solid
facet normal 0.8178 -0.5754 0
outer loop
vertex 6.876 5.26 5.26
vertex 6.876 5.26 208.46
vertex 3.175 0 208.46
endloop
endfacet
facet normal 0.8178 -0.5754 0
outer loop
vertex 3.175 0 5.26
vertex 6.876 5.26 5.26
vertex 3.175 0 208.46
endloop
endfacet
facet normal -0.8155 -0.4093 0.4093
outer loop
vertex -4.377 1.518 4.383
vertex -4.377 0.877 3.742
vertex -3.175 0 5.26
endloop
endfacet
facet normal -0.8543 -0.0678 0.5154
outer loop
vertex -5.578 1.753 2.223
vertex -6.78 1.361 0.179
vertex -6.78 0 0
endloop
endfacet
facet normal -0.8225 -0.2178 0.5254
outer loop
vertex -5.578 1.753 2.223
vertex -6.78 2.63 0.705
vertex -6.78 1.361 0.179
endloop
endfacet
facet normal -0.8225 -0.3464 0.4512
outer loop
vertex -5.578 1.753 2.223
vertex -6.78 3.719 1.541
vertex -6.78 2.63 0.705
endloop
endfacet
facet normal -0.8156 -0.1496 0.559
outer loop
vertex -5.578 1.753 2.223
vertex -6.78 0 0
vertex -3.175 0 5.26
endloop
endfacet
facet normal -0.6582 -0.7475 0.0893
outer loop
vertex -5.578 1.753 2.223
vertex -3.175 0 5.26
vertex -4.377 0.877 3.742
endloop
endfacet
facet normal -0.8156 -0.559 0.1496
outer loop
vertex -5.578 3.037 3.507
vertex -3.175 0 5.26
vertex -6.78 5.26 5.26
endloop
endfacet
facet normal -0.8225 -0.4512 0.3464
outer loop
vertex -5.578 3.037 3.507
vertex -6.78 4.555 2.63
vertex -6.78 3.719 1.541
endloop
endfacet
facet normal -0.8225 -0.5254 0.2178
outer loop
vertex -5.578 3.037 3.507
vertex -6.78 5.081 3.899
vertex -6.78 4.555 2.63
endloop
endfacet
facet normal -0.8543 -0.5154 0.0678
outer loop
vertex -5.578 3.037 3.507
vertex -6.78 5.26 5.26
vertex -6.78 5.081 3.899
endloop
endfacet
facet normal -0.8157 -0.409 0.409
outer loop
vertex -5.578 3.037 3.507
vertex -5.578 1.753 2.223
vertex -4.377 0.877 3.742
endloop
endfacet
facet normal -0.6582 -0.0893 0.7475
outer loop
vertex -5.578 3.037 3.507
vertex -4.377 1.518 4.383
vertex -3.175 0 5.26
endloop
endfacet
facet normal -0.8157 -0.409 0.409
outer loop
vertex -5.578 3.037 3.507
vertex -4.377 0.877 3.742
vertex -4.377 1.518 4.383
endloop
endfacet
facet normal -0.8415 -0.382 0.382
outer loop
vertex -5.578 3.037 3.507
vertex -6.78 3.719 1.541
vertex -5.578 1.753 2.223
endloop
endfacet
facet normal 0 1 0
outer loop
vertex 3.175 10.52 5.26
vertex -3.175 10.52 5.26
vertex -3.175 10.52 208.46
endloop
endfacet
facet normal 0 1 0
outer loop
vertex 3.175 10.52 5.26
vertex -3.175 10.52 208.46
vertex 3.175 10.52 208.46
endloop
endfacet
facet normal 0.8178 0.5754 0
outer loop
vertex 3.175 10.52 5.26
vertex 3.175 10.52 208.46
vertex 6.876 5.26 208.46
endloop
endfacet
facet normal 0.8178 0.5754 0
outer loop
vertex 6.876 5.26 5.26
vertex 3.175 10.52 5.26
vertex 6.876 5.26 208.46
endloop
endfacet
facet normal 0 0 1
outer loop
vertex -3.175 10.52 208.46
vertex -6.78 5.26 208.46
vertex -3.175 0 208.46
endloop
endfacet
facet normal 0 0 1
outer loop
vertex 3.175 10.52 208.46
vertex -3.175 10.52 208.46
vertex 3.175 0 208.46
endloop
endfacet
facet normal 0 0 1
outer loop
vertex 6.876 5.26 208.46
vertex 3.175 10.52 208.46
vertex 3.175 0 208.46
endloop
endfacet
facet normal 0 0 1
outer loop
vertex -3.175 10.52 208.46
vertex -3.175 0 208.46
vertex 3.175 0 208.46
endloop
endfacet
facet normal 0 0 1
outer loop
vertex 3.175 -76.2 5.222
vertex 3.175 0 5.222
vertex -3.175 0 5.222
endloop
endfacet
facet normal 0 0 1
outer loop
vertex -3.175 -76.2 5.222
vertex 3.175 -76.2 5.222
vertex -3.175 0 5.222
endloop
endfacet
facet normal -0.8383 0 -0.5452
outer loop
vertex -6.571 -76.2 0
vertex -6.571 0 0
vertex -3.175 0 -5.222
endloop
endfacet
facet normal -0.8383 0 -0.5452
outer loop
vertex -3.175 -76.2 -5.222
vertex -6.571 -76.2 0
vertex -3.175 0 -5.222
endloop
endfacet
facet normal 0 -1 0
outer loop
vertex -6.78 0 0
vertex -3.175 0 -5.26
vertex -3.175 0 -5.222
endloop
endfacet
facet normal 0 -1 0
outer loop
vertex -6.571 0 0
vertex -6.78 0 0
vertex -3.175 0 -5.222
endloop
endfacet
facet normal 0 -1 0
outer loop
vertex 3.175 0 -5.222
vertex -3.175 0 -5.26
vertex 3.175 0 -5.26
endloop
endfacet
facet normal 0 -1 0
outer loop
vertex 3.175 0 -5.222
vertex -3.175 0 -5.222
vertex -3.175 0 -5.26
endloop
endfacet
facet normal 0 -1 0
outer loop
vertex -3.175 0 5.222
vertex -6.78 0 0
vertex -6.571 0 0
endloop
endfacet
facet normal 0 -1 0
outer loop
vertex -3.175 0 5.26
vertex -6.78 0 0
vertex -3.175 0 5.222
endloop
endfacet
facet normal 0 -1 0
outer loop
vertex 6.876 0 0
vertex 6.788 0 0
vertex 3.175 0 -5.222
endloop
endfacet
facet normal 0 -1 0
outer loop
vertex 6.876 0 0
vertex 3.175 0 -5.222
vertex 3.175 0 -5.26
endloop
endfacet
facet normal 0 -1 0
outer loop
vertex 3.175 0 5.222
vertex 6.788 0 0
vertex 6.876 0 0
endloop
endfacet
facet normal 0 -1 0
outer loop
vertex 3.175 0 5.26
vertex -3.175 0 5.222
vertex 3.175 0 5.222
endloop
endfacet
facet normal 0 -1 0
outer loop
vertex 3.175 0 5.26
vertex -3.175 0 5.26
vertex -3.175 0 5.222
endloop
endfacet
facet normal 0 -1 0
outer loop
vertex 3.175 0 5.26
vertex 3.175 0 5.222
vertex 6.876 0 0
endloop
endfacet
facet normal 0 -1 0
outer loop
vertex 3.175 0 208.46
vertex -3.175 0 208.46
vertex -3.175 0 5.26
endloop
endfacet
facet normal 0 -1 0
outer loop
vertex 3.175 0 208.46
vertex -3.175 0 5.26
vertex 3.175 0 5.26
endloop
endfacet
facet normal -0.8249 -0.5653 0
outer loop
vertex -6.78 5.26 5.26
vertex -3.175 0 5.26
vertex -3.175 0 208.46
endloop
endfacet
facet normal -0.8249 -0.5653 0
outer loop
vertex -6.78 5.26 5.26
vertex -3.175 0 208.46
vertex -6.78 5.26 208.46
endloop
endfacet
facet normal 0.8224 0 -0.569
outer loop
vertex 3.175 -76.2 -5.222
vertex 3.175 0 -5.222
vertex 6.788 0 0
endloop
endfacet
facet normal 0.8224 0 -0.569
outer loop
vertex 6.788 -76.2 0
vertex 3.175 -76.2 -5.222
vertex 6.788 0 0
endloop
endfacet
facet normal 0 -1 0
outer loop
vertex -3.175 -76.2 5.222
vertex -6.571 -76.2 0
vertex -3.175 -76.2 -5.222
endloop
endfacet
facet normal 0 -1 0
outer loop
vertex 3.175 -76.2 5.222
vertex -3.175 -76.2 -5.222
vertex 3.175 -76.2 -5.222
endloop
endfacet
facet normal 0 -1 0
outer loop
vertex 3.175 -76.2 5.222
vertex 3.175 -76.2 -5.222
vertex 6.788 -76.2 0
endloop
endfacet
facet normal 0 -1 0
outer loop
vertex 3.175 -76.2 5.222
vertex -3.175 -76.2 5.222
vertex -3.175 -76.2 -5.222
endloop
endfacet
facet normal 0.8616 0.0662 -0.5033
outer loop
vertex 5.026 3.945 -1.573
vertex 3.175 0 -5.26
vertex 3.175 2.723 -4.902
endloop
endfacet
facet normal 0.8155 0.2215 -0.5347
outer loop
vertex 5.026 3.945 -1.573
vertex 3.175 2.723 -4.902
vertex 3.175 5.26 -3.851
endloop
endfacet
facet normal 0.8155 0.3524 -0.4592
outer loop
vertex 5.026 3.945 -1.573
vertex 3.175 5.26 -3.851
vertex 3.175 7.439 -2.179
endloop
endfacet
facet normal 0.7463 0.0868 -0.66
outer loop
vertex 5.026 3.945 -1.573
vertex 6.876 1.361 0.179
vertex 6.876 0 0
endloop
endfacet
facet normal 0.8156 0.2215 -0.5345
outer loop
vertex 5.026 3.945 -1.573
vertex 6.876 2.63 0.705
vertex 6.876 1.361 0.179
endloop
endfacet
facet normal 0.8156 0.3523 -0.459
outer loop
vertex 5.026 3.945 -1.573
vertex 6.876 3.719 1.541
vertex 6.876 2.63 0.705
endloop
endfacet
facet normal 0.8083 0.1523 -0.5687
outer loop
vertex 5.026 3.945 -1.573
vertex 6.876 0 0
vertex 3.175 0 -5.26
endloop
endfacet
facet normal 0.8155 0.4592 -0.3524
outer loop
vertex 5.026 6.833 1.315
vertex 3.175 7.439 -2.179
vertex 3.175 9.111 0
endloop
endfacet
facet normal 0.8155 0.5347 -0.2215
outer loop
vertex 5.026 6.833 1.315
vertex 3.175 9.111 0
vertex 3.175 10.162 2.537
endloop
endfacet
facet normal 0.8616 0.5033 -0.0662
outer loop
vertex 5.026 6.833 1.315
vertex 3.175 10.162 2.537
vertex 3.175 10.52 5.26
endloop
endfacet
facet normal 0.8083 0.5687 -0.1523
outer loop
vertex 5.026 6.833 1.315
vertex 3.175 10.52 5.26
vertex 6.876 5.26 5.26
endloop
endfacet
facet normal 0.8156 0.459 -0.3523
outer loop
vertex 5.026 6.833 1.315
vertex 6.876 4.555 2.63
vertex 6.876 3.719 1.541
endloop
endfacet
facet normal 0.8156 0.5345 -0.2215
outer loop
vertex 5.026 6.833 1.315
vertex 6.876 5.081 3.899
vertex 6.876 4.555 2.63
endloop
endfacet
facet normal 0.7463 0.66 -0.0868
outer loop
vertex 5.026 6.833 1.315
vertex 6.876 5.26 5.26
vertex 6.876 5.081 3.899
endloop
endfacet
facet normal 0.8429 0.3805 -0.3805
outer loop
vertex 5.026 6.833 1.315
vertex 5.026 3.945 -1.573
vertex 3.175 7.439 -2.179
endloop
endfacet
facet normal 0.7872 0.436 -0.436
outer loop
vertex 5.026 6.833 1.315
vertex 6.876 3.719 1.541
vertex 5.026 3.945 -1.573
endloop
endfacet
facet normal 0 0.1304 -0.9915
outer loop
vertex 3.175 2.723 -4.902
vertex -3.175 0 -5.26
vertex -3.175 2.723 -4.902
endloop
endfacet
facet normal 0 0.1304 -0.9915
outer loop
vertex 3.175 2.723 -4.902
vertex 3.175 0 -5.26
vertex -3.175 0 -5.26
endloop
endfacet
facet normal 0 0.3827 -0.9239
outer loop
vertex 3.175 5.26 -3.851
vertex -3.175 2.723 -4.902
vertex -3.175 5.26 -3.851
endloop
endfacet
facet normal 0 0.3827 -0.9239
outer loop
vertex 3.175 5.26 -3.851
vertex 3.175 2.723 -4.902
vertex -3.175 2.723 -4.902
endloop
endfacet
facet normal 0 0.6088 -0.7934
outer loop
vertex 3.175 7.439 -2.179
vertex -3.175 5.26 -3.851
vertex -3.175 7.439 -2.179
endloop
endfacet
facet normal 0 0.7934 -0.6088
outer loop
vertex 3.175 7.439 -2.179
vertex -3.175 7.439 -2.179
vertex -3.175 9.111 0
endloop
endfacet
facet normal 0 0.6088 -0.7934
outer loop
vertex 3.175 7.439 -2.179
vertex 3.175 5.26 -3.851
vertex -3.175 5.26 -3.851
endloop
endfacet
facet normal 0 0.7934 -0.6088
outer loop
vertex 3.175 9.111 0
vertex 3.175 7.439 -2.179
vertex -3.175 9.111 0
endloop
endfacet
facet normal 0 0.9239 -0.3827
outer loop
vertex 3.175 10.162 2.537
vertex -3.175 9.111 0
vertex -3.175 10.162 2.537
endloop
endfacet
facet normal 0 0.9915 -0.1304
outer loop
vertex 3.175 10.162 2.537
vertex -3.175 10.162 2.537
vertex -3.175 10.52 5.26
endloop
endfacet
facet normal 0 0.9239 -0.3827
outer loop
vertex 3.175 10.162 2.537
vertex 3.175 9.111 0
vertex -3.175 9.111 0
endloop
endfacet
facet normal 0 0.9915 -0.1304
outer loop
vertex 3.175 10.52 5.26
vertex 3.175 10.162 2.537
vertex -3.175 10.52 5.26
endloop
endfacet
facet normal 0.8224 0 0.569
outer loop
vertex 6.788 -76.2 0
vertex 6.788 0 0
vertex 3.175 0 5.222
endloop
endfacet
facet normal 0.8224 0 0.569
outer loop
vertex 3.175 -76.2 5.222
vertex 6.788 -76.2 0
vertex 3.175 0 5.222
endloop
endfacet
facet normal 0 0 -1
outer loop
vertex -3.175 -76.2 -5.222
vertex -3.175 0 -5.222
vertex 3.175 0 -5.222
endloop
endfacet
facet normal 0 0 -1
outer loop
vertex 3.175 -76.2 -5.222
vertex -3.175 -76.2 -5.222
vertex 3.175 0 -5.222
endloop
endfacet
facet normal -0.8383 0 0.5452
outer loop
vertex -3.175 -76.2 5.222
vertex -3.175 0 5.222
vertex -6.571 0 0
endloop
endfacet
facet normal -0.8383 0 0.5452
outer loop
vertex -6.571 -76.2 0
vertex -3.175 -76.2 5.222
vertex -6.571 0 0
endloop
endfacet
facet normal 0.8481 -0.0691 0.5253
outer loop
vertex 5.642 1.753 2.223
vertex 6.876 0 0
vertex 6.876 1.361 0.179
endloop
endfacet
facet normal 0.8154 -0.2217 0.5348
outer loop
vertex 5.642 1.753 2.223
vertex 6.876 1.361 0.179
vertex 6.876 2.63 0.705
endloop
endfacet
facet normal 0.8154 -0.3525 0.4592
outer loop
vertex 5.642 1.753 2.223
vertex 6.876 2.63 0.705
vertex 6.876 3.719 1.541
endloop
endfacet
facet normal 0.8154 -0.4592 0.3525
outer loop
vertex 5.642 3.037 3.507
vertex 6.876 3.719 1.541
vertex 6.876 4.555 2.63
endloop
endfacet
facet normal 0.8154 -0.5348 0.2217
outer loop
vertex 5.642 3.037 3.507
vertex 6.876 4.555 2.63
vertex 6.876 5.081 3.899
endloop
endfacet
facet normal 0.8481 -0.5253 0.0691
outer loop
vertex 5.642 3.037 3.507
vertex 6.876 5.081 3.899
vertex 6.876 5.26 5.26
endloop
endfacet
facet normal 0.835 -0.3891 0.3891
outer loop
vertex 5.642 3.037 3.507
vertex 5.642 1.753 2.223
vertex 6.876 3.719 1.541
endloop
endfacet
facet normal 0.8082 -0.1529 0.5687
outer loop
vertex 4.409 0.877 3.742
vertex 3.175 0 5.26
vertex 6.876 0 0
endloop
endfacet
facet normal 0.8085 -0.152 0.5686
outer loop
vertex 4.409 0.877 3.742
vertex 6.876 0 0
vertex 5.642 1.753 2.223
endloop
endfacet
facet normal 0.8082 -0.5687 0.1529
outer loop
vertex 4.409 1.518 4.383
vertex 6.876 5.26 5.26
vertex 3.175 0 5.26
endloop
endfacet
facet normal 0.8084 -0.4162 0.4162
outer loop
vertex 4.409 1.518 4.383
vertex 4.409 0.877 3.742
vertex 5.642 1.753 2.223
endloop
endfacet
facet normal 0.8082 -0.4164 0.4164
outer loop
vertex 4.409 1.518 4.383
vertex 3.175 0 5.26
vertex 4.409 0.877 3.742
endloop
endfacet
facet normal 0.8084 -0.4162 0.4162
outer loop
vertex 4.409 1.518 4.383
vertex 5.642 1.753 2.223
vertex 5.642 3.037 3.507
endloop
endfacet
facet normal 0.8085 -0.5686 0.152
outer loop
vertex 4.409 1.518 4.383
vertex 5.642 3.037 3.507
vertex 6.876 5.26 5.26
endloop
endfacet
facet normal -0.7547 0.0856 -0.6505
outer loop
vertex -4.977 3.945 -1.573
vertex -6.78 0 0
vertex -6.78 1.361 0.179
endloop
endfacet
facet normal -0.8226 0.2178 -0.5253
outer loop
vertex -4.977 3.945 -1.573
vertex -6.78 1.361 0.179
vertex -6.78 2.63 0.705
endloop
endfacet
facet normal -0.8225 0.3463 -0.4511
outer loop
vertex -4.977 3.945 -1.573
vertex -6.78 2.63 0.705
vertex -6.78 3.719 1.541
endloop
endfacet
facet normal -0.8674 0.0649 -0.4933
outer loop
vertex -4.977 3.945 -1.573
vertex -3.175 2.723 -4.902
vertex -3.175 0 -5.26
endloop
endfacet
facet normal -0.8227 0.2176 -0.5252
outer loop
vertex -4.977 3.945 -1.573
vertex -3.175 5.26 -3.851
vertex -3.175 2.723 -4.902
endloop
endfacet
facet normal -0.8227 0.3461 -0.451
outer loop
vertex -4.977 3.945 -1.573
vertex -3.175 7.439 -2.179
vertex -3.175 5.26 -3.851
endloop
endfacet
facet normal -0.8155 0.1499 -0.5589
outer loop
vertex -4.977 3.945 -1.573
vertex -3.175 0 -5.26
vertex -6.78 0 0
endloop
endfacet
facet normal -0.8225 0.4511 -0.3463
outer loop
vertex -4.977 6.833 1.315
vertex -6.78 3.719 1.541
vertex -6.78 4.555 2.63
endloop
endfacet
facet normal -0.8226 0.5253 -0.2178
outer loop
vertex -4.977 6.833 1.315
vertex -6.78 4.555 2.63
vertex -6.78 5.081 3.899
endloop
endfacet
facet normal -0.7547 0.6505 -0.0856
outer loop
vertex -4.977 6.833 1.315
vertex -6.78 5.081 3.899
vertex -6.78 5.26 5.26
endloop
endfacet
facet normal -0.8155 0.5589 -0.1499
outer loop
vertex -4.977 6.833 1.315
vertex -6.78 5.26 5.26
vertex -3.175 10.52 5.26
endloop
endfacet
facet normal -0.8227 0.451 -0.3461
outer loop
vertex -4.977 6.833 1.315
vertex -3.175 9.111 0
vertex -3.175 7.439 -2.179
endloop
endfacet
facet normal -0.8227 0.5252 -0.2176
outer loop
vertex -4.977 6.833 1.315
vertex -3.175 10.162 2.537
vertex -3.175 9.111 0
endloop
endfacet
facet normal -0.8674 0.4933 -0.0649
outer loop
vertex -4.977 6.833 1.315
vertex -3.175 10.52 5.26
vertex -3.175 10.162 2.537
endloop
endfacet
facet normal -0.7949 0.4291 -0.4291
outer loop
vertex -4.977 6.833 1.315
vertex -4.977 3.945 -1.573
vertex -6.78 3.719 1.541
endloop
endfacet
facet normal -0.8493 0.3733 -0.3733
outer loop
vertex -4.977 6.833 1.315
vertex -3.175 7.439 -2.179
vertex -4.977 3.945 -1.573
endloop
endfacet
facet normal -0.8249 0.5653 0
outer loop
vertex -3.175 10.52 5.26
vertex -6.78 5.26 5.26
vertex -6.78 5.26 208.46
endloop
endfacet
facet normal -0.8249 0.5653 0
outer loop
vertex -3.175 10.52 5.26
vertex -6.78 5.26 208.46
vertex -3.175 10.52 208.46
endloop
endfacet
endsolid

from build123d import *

# Parameters (mm, degrees)
F1_DEPTH = 76.2
F3_ANGLE = 90
F4_DEPTH = 203.2


with BuildPart() as f1:
    # F0 (on Front) → F1 (new body)
    with BuildSketch(Plane.XZ):
        Polygon((-6.5709403187, 0), (-3.175, -5.2222484378), (3.175, -5.2222484378), (6.7875643598, 0), (3.175, 5.2222484378), (-3.175, 5.2222484378), align=None)
    extrude(amount=F1_DEPTH)

    # F2 (on Front) → F3 (revolve)
    with BuildSketch(Plane.XZ):
        Polygon((-3.175, -5.2600912928), (3.175, -5.2600912928), (6.8761393004, 0), (3.175, 5.2600912928), (-3.175, 5.2600912928), (-6.7797889493, 0), align=None)
    revolve(axis=Axis((0, 0, 5.2600912928), (1, 0, 0)), revolution_arc=F3_ANGLE)

    # F4 (add): a face of the model
    f4_faces = [f1.faces().sort_by_distance(p)[0] for p in [
        (0.0270197551, 5.2600912928, 5.2600912928),
    ]]
    extrude(f4_faces, amount=F4_DEPTH)


solid = f1.part
